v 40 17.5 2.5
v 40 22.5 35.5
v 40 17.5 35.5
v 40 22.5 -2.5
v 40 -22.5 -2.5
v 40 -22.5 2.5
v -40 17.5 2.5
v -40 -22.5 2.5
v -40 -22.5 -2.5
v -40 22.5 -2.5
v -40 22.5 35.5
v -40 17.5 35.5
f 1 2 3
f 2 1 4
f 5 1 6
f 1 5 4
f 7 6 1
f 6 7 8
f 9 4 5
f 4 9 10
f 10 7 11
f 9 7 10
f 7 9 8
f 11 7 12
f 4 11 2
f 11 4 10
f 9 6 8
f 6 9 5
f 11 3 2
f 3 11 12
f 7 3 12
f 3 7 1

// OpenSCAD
// Starter file for task-016.
// Edit this file in OpenSCAD to complete the requested hard task.
$fn = 64;

base = [80, 45, 5];
back = [80, 5, 35];
cube(base, center=true);
translate([0, 20, 18]) cube(back, center=true);
